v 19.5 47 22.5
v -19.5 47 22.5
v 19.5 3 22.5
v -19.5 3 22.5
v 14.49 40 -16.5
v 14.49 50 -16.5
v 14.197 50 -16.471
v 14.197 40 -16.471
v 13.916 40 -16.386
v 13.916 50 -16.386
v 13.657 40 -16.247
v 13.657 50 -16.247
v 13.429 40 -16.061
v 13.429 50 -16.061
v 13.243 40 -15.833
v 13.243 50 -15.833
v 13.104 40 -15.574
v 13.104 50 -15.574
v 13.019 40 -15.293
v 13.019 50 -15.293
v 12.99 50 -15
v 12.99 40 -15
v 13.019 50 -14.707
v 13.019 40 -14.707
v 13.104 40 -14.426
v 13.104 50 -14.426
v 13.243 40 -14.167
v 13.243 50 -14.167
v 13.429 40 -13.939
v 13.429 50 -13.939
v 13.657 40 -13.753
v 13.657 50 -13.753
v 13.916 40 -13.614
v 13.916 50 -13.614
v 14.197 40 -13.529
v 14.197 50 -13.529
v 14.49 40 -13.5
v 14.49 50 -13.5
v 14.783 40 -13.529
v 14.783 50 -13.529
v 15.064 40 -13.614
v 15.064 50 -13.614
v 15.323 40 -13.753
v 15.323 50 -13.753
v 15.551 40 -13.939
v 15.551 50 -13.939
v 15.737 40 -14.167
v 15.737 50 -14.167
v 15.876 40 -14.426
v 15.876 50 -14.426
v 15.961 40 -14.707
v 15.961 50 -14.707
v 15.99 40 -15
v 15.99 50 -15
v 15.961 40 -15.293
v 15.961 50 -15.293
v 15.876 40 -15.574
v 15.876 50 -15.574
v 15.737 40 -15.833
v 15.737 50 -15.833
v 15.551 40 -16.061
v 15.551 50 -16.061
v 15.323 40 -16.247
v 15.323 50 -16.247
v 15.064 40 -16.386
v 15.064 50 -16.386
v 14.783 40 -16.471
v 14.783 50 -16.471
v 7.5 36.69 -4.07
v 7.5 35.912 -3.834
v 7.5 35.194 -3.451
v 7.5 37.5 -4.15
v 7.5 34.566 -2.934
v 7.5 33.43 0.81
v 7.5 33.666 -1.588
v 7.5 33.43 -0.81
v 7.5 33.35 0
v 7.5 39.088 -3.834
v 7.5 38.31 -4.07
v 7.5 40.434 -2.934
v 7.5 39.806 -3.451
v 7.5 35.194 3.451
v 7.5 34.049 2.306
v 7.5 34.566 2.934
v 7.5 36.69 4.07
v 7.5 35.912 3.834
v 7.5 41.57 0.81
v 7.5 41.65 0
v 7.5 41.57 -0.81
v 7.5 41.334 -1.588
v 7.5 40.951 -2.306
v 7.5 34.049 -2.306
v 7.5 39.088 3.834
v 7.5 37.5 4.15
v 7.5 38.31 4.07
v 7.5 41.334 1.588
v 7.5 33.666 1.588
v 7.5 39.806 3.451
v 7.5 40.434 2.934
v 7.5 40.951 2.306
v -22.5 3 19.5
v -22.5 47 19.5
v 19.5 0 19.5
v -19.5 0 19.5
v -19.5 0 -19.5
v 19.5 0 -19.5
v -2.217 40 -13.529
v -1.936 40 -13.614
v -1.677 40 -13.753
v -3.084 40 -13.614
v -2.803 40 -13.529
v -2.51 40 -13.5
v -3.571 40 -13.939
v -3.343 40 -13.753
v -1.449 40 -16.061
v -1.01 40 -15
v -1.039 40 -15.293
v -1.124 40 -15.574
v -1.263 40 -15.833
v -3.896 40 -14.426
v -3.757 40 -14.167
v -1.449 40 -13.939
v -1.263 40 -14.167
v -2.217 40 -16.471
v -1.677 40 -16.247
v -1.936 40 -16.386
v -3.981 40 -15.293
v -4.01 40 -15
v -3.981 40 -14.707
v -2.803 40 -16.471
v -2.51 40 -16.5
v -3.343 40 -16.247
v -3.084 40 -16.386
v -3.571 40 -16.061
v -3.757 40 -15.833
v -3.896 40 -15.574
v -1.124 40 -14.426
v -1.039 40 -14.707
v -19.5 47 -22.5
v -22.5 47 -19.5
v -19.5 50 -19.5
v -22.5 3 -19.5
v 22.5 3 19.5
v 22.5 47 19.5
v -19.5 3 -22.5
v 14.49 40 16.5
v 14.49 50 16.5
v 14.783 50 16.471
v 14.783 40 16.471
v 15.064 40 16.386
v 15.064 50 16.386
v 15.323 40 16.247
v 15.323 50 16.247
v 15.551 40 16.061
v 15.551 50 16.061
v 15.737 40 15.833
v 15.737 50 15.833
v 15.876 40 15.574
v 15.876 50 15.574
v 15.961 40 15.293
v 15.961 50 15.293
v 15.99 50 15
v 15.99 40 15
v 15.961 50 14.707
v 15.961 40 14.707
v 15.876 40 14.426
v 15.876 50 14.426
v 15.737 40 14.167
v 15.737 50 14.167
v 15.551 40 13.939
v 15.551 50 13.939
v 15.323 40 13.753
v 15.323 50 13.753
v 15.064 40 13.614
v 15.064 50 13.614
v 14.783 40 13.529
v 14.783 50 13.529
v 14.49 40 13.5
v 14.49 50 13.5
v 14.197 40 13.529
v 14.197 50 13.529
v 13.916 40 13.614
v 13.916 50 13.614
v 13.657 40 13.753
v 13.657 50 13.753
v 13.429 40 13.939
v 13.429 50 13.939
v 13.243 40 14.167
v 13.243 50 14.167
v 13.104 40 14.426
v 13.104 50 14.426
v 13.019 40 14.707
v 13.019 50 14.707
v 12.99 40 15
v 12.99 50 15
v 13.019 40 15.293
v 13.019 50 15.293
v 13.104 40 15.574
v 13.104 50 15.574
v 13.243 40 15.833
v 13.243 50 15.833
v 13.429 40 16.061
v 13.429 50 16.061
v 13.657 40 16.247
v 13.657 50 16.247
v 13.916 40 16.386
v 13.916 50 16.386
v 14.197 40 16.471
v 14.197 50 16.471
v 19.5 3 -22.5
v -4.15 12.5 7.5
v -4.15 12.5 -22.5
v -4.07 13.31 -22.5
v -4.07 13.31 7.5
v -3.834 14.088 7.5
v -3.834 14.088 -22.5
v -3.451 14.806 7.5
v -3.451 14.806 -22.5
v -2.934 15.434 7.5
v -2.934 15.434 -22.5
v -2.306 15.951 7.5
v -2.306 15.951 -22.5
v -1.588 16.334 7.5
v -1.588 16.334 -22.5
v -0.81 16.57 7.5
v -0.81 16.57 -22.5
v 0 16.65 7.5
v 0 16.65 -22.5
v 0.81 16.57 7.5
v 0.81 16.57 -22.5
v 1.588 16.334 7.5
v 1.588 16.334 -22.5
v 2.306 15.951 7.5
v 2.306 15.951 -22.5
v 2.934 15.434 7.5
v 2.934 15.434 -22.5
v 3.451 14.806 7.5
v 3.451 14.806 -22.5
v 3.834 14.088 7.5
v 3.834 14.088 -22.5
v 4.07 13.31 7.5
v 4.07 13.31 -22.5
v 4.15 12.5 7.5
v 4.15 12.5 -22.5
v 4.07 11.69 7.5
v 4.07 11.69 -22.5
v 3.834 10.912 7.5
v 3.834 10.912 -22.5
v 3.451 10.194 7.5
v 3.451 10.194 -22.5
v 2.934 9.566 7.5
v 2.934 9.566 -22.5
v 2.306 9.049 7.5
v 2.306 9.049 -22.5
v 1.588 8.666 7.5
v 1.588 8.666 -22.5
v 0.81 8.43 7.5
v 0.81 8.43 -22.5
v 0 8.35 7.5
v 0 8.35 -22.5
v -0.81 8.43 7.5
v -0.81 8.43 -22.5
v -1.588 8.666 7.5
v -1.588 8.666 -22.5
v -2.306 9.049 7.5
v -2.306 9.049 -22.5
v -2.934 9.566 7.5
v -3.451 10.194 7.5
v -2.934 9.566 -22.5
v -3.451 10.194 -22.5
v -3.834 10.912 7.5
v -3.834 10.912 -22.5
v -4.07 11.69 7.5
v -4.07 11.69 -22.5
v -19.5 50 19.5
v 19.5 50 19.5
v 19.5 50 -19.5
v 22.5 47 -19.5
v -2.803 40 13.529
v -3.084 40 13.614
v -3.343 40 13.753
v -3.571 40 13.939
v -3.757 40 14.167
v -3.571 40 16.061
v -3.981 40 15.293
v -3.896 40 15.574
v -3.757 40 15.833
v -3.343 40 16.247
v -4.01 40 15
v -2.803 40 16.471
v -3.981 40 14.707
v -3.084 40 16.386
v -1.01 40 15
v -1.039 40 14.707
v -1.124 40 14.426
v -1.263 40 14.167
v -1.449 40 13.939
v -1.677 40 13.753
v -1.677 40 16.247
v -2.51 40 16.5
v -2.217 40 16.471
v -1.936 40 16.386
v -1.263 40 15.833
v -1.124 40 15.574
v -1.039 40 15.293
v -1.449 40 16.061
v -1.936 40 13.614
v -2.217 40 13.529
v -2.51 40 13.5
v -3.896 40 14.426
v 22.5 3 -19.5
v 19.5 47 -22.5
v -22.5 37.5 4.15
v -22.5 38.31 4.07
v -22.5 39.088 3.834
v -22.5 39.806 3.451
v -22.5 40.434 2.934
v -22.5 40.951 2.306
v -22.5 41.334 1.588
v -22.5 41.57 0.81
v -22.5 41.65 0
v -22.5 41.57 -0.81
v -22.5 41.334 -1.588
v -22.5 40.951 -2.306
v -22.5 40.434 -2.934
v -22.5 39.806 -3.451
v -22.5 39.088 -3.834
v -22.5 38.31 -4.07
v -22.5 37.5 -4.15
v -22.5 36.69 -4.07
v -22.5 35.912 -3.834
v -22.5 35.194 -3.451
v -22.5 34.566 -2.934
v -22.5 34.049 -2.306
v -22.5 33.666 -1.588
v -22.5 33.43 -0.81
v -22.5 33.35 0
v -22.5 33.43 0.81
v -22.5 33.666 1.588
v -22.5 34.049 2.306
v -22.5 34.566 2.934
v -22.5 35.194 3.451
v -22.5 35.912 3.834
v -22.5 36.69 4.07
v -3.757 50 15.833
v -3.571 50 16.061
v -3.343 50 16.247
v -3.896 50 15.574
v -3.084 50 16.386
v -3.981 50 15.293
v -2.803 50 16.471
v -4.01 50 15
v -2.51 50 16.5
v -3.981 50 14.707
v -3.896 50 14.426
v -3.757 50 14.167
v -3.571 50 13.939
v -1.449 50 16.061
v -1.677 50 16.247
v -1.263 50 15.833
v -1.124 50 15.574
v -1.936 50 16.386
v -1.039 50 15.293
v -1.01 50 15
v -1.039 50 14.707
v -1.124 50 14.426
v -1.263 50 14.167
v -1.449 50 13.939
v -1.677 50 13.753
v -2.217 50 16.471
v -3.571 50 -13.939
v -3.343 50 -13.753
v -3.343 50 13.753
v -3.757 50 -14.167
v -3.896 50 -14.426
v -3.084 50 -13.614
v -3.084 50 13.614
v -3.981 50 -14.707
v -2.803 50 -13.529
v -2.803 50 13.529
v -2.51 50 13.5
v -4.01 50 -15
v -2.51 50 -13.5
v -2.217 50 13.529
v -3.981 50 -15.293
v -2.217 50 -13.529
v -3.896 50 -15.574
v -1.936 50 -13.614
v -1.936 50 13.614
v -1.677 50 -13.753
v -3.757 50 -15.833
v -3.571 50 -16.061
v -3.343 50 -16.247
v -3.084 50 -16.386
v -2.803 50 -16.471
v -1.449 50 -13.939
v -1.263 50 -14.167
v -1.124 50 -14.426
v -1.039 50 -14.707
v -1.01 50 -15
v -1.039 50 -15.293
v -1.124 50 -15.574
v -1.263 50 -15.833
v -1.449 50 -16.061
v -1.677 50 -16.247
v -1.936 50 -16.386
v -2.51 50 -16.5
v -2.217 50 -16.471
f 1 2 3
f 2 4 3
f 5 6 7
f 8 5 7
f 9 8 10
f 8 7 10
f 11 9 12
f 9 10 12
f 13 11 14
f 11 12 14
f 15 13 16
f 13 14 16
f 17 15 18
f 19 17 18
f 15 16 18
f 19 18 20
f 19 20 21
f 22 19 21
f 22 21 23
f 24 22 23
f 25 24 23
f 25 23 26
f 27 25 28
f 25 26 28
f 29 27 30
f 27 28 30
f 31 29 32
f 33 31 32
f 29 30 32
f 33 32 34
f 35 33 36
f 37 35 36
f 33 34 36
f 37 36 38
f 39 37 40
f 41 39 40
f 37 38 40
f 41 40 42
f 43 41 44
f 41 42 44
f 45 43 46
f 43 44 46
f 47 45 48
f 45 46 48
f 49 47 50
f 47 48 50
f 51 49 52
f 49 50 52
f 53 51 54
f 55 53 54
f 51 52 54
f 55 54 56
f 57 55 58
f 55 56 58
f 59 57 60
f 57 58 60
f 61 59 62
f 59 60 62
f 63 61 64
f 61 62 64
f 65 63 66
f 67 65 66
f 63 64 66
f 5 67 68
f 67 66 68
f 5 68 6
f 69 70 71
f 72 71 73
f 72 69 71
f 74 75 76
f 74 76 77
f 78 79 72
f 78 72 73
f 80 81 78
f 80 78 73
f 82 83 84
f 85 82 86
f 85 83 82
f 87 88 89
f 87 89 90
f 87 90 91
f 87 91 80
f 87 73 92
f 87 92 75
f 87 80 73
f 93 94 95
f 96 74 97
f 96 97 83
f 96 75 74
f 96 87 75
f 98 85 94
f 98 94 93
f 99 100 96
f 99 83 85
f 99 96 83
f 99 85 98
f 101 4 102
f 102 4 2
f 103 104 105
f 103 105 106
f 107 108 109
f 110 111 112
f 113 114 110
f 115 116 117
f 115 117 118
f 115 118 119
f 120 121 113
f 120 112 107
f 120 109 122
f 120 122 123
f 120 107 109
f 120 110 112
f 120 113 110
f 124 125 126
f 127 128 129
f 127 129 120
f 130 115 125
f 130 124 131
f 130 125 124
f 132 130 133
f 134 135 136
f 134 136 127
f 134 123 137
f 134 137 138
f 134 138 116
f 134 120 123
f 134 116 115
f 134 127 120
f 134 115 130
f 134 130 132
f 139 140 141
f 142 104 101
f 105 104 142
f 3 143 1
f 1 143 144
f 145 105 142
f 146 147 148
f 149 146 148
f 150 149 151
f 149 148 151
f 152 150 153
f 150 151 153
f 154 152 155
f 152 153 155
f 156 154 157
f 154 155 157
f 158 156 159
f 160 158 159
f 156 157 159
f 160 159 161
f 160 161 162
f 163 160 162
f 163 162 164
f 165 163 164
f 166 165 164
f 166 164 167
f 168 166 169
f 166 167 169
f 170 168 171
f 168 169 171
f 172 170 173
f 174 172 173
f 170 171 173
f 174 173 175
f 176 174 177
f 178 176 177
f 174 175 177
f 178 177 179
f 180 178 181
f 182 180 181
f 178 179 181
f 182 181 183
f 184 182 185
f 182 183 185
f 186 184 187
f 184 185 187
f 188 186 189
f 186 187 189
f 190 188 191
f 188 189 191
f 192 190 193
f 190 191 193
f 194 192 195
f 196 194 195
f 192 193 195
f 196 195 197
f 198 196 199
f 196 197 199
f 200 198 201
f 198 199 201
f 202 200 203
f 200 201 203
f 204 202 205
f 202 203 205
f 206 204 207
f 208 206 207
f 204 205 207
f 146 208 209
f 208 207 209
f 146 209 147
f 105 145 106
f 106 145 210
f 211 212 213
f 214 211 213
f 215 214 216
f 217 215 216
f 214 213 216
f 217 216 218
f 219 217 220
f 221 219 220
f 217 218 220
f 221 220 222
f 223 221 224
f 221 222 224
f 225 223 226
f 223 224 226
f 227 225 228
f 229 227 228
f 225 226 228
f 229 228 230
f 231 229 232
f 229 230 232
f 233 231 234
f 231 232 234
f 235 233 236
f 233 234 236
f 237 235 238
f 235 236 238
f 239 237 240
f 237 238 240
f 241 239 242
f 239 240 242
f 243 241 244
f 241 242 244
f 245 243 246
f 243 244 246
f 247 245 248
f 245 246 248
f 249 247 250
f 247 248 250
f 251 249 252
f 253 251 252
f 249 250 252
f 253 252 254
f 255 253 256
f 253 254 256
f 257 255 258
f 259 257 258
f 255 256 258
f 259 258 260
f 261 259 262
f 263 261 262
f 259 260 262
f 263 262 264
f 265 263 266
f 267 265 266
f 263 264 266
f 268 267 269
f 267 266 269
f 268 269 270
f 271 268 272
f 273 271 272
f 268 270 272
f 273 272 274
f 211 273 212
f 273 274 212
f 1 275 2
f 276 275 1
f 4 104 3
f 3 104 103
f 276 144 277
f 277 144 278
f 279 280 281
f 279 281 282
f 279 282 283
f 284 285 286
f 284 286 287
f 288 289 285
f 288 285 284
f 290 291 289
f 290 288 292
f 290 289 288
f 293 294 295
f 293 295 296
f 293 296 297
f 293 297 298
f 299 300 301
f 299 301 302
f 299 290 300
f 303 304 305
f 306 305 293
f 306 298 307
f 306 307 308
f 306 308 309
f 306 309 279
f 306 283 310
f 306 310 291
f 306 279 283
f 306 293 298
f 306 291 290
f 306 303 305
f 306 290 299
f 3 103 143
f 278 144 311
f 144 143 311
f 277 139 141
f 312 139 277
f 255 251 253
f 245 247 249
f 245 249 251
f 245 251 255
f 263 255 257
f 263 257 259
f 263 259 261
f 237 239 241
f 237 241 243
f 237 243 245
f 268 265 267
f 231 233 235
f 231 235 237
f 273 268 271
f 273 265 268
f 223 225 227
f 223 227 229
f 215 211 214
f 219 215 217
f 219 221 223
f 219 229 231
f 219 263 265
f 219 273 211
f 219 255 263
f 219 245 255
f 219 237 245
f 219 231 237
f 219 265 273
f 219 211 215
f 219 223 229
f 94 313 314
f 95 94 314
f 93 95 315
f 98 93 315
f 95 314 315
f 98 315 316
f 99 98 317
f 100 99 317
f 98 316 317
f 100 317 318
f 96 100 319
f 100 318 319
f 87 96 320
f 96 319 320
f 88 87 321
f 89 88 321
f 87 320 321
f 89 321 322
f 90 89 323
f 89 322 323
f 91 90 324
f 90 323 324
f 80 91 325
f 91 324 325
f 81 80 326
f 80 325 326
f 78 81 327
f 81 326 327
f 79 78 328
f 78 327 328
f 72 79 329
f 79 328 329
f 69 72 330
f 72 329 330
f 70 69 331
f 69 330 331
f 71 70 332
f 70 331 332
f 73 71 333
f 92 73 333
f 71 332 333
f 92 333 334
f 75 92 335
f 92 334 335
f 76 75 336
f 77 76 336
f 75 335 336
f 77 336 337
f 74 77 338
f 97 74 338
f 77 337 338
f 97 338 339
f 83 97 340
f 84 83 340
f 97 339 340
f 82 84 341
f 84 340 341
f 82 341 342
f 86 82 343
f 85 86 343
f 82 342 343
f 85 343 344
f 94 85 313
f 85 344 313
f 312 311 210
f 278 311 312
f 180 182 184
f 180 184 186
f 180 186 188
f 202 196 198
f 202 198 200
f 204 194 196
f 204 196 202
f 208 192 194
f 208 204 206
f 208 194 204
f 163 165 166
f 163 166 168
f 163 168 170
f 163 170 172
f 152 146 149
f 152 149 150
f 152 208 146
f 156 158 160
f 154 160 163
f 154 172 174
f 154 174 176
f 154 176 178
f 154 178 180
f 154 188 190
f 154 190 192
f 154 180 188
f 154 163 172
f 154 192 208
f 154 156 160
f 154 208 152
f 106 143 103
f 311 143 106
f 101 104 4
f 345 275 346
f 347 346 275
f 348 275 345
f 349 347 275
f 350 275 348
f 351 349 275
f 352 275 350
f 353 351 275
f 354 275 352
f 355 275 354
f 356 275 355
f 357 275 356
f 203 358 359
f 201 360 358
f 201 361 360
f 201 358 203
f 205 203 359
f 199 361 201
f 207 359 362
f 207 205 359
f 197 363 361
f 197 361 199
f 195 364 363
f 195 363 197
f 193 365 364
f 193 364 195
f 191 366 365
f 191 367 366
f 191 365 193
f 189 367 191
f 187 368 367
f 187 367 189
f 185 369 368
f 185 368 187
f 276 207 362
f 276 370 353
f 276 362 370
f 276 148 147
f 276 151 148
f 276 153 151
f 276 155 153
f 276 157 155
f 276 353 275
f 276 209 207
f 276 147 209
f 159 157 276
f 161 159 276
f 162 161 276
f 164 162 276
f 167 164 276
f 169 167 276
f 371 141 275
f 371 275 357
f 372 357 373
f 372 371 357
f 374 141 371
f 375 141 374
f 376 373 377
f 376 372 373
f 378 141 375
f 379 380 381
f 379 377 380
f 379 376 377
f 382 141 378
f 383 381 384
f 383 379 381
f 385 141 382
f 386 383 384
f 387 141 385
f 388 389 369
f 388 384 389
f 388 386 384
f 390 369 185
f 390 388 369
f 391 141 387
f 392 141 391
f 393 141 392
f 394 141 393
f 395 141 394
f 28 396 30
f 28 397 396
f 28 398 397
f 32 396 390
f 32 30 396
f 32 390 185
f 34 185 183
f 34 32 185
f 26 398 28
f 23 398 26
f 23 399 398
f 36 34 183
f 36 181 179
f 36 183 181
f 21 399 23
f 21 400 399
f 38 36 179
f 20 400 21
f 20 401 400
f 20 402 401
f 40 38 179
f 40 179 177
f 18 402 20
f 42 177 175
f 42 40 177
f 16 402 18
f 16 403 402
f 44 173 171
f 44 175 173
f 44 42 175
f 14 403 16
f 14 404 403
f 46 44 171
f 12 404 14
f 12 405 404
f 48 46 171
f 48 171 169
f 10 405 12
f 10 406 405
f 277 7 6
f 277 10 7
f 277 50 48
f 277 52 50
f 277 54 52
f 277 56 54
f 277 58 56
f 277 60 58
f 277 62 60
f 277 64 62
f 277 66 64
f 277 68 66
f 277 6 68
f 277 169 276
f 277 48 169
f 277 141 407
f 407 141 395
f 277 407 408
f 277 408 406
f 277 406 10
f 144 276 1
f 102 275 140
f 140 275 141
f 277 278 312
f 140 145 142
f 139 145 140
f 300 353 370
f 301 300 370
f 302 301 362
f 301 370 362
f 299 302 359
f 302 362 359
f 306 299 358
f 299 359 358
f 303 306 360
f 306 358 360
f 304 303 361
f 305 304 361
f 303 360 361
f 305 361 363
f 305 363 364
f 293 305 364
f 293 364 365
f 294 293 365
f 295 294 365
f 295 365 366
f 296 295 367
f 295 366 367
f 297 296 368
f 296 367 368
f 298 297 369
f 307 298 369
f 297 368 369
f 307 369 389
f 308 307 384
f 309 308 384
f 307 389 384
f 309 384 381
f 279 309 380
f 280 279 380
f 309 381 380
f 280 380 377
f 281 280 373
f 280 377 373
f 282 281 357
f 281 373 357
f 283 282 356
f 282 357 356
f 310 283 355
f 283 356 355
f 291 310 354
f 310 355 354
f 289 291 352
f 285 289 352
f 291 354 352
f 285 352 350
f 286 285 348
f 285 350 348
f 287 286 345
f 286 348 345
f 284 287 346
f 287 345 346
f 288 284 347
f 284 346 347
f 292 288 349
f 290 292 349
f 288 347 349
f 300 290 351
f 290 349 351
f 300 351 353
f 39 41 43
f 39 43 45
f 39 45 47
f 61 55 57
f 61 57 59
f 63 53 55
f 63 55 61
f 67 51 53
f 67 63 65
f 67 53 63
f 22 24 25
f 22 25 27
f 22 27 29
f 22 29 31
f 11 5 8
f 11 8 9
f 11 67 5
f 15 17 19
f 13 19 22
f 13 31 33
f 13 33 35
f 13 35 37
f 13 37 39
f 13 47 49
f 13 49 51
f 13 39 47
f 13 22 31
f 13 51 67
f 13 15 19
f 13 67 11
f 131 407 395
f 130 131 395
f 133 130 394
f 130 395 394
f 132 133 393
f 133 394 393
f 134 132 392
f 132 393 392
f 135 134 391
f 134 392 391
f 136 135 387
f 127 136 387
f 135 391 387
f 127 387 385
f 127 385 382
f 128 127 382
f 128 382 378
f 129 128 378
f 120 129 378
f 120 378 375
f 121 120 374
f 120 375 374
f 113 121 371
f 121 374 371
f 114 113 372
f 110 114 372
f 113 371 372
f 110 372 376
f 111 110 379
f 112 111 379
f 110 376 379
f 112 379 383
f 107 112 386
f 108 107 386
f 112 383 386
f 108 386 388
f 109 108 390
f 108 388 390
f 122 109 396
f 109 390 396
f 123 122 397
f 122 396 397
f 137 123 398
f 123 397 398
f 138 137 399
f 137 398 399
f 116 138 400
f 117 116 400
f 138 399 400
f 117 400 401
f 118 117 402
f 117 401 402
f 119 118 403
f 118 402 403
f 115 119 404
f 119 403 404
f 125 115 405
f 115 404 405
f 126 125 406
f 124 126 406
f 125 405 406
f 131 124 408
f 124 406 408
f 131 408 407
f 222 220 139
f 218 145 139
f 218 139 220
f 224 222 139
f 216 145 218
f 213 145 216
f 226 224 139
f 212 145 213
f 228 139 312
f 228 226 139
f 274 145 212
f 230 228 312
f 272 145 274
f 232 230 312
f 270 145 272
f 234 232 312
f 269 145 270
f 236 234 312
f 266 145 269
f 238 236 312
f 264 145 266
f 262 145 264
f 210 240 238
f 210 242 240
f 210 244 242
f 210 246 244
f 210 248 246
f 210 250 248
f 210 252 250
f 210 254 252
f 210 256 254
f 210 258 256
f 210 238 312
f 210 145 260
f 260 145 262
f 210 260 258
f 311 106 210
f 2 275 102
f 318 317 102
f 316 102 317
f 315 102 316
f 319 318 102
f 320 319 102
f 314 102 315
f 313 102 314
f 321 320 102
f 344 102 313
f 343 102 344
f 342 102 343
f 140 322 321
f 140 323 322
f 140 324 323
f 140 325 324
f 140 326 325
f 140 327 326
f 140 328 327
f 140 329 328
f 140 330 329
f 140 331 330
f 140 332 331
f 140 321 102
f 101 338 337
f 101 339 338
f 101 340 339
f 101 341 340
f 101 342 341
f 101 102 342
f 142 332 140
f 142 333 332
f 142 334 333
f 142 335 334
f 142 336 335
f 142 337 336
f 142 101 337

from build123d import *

# Parameters (mm, degrees)
SKETCH1_W           = 45
SKETCH1_H           = 45
BOSS_EXTRUDE1_DEPTH = 50
SKETCH2_R           = 4.15
CUT_EXTRUDE1_DEPTH  = 30
SKETCH3_R           = 4.15
CUT_EXTRUDE2_DEPTH  = 30
CHAMFER1_SIZE       = 3
SKETCH5_R           = 1.5
CUT_EXTRUDE3_DEPTH  = 10


with BuildPart() as part:
    # Sketch1 → Boss-Extrude1 (new body)
    with BuildSketch(Plane(origin=(0, 0, 0), x_dir=(1, 0, 0), z_dir=(0, 1, 0))):
        Rectangle(SKETCH1_W, SKETCH1_H)
    extrude(amount=BOSS_EXTRUDE1_DEPTH)

    # Sketch2 → Cut-Extrude1 (cut)
    with BuildSketch(Plane(origin=(0, 0, -22.5), x_dir=(-1, 0, 0), z_dir=(0, 0, -1))):
        with Locations((0, 12.5)):
            Circle(SKETCH2_R)
    extrude(amount=-CUT_EXTRUDE1_DEPTH, mode=Mode.SUBTRACT)

    # Sketch3 → Cut-Extrude2 (cut)
    with BuildSketch(Plane.ZY.offset(22.5)):
        with Locations((0, 37.5)):
            Circle(SKETCH3_R)
    extrude(amount=-CUT_EXTRUDE2_DEPTH, mode=Mode.SUBTRACT)

    # Chamfer1
    chamfer1_edges = [part.edges().sort_by_distance(p)[0] for p in [
        (-22.5, 50, 0),
        (0, 50, 22.5),
        (22.5, 50, 0),
        (0, 0, 22.5),
        (-22.5, 0, 0),
        (0, 0, -22.5),
        (22.5, 0, 0),
        (22.5, 25, 22.5),
        (-22.5, 25, 22.5),
        (-22.5, 25, -22.5),
        (22.5, 25, -22.5),
        (0, 50, -22.5),
    ]]
    chamfer(chamfer1_edges, length=CHAMFER1_SIZE)

    # Sketch5 → Cut-Extrude3 (cut)
    with BuildSketch(Plane(origin=(0, 50, 0), x_dir=(1, 0, 0), z_dir=(0, 1, 0))):
        with Locations(Location((-2.51, -15, 0), (0, 0, 270))):
            Circle(SKETCH5_R)
        with Locations(Location((14.49, -15, 0), (0, 0, 270))):
            Circle(SKETCH5_R)
        with Locations(Location((14.49, 15, 0), (0, 0, 90))):
            Circle(SKETCH5_R)
        with Locations(Location((-2.51, 15, 0), (0, 0, 90))):
            Circle(SKETCH5_R)
    extrude(amount=-CUT_EXTRUDE3_DEPTH, mode=Mode.SUBTRACT)


solid = part.part
